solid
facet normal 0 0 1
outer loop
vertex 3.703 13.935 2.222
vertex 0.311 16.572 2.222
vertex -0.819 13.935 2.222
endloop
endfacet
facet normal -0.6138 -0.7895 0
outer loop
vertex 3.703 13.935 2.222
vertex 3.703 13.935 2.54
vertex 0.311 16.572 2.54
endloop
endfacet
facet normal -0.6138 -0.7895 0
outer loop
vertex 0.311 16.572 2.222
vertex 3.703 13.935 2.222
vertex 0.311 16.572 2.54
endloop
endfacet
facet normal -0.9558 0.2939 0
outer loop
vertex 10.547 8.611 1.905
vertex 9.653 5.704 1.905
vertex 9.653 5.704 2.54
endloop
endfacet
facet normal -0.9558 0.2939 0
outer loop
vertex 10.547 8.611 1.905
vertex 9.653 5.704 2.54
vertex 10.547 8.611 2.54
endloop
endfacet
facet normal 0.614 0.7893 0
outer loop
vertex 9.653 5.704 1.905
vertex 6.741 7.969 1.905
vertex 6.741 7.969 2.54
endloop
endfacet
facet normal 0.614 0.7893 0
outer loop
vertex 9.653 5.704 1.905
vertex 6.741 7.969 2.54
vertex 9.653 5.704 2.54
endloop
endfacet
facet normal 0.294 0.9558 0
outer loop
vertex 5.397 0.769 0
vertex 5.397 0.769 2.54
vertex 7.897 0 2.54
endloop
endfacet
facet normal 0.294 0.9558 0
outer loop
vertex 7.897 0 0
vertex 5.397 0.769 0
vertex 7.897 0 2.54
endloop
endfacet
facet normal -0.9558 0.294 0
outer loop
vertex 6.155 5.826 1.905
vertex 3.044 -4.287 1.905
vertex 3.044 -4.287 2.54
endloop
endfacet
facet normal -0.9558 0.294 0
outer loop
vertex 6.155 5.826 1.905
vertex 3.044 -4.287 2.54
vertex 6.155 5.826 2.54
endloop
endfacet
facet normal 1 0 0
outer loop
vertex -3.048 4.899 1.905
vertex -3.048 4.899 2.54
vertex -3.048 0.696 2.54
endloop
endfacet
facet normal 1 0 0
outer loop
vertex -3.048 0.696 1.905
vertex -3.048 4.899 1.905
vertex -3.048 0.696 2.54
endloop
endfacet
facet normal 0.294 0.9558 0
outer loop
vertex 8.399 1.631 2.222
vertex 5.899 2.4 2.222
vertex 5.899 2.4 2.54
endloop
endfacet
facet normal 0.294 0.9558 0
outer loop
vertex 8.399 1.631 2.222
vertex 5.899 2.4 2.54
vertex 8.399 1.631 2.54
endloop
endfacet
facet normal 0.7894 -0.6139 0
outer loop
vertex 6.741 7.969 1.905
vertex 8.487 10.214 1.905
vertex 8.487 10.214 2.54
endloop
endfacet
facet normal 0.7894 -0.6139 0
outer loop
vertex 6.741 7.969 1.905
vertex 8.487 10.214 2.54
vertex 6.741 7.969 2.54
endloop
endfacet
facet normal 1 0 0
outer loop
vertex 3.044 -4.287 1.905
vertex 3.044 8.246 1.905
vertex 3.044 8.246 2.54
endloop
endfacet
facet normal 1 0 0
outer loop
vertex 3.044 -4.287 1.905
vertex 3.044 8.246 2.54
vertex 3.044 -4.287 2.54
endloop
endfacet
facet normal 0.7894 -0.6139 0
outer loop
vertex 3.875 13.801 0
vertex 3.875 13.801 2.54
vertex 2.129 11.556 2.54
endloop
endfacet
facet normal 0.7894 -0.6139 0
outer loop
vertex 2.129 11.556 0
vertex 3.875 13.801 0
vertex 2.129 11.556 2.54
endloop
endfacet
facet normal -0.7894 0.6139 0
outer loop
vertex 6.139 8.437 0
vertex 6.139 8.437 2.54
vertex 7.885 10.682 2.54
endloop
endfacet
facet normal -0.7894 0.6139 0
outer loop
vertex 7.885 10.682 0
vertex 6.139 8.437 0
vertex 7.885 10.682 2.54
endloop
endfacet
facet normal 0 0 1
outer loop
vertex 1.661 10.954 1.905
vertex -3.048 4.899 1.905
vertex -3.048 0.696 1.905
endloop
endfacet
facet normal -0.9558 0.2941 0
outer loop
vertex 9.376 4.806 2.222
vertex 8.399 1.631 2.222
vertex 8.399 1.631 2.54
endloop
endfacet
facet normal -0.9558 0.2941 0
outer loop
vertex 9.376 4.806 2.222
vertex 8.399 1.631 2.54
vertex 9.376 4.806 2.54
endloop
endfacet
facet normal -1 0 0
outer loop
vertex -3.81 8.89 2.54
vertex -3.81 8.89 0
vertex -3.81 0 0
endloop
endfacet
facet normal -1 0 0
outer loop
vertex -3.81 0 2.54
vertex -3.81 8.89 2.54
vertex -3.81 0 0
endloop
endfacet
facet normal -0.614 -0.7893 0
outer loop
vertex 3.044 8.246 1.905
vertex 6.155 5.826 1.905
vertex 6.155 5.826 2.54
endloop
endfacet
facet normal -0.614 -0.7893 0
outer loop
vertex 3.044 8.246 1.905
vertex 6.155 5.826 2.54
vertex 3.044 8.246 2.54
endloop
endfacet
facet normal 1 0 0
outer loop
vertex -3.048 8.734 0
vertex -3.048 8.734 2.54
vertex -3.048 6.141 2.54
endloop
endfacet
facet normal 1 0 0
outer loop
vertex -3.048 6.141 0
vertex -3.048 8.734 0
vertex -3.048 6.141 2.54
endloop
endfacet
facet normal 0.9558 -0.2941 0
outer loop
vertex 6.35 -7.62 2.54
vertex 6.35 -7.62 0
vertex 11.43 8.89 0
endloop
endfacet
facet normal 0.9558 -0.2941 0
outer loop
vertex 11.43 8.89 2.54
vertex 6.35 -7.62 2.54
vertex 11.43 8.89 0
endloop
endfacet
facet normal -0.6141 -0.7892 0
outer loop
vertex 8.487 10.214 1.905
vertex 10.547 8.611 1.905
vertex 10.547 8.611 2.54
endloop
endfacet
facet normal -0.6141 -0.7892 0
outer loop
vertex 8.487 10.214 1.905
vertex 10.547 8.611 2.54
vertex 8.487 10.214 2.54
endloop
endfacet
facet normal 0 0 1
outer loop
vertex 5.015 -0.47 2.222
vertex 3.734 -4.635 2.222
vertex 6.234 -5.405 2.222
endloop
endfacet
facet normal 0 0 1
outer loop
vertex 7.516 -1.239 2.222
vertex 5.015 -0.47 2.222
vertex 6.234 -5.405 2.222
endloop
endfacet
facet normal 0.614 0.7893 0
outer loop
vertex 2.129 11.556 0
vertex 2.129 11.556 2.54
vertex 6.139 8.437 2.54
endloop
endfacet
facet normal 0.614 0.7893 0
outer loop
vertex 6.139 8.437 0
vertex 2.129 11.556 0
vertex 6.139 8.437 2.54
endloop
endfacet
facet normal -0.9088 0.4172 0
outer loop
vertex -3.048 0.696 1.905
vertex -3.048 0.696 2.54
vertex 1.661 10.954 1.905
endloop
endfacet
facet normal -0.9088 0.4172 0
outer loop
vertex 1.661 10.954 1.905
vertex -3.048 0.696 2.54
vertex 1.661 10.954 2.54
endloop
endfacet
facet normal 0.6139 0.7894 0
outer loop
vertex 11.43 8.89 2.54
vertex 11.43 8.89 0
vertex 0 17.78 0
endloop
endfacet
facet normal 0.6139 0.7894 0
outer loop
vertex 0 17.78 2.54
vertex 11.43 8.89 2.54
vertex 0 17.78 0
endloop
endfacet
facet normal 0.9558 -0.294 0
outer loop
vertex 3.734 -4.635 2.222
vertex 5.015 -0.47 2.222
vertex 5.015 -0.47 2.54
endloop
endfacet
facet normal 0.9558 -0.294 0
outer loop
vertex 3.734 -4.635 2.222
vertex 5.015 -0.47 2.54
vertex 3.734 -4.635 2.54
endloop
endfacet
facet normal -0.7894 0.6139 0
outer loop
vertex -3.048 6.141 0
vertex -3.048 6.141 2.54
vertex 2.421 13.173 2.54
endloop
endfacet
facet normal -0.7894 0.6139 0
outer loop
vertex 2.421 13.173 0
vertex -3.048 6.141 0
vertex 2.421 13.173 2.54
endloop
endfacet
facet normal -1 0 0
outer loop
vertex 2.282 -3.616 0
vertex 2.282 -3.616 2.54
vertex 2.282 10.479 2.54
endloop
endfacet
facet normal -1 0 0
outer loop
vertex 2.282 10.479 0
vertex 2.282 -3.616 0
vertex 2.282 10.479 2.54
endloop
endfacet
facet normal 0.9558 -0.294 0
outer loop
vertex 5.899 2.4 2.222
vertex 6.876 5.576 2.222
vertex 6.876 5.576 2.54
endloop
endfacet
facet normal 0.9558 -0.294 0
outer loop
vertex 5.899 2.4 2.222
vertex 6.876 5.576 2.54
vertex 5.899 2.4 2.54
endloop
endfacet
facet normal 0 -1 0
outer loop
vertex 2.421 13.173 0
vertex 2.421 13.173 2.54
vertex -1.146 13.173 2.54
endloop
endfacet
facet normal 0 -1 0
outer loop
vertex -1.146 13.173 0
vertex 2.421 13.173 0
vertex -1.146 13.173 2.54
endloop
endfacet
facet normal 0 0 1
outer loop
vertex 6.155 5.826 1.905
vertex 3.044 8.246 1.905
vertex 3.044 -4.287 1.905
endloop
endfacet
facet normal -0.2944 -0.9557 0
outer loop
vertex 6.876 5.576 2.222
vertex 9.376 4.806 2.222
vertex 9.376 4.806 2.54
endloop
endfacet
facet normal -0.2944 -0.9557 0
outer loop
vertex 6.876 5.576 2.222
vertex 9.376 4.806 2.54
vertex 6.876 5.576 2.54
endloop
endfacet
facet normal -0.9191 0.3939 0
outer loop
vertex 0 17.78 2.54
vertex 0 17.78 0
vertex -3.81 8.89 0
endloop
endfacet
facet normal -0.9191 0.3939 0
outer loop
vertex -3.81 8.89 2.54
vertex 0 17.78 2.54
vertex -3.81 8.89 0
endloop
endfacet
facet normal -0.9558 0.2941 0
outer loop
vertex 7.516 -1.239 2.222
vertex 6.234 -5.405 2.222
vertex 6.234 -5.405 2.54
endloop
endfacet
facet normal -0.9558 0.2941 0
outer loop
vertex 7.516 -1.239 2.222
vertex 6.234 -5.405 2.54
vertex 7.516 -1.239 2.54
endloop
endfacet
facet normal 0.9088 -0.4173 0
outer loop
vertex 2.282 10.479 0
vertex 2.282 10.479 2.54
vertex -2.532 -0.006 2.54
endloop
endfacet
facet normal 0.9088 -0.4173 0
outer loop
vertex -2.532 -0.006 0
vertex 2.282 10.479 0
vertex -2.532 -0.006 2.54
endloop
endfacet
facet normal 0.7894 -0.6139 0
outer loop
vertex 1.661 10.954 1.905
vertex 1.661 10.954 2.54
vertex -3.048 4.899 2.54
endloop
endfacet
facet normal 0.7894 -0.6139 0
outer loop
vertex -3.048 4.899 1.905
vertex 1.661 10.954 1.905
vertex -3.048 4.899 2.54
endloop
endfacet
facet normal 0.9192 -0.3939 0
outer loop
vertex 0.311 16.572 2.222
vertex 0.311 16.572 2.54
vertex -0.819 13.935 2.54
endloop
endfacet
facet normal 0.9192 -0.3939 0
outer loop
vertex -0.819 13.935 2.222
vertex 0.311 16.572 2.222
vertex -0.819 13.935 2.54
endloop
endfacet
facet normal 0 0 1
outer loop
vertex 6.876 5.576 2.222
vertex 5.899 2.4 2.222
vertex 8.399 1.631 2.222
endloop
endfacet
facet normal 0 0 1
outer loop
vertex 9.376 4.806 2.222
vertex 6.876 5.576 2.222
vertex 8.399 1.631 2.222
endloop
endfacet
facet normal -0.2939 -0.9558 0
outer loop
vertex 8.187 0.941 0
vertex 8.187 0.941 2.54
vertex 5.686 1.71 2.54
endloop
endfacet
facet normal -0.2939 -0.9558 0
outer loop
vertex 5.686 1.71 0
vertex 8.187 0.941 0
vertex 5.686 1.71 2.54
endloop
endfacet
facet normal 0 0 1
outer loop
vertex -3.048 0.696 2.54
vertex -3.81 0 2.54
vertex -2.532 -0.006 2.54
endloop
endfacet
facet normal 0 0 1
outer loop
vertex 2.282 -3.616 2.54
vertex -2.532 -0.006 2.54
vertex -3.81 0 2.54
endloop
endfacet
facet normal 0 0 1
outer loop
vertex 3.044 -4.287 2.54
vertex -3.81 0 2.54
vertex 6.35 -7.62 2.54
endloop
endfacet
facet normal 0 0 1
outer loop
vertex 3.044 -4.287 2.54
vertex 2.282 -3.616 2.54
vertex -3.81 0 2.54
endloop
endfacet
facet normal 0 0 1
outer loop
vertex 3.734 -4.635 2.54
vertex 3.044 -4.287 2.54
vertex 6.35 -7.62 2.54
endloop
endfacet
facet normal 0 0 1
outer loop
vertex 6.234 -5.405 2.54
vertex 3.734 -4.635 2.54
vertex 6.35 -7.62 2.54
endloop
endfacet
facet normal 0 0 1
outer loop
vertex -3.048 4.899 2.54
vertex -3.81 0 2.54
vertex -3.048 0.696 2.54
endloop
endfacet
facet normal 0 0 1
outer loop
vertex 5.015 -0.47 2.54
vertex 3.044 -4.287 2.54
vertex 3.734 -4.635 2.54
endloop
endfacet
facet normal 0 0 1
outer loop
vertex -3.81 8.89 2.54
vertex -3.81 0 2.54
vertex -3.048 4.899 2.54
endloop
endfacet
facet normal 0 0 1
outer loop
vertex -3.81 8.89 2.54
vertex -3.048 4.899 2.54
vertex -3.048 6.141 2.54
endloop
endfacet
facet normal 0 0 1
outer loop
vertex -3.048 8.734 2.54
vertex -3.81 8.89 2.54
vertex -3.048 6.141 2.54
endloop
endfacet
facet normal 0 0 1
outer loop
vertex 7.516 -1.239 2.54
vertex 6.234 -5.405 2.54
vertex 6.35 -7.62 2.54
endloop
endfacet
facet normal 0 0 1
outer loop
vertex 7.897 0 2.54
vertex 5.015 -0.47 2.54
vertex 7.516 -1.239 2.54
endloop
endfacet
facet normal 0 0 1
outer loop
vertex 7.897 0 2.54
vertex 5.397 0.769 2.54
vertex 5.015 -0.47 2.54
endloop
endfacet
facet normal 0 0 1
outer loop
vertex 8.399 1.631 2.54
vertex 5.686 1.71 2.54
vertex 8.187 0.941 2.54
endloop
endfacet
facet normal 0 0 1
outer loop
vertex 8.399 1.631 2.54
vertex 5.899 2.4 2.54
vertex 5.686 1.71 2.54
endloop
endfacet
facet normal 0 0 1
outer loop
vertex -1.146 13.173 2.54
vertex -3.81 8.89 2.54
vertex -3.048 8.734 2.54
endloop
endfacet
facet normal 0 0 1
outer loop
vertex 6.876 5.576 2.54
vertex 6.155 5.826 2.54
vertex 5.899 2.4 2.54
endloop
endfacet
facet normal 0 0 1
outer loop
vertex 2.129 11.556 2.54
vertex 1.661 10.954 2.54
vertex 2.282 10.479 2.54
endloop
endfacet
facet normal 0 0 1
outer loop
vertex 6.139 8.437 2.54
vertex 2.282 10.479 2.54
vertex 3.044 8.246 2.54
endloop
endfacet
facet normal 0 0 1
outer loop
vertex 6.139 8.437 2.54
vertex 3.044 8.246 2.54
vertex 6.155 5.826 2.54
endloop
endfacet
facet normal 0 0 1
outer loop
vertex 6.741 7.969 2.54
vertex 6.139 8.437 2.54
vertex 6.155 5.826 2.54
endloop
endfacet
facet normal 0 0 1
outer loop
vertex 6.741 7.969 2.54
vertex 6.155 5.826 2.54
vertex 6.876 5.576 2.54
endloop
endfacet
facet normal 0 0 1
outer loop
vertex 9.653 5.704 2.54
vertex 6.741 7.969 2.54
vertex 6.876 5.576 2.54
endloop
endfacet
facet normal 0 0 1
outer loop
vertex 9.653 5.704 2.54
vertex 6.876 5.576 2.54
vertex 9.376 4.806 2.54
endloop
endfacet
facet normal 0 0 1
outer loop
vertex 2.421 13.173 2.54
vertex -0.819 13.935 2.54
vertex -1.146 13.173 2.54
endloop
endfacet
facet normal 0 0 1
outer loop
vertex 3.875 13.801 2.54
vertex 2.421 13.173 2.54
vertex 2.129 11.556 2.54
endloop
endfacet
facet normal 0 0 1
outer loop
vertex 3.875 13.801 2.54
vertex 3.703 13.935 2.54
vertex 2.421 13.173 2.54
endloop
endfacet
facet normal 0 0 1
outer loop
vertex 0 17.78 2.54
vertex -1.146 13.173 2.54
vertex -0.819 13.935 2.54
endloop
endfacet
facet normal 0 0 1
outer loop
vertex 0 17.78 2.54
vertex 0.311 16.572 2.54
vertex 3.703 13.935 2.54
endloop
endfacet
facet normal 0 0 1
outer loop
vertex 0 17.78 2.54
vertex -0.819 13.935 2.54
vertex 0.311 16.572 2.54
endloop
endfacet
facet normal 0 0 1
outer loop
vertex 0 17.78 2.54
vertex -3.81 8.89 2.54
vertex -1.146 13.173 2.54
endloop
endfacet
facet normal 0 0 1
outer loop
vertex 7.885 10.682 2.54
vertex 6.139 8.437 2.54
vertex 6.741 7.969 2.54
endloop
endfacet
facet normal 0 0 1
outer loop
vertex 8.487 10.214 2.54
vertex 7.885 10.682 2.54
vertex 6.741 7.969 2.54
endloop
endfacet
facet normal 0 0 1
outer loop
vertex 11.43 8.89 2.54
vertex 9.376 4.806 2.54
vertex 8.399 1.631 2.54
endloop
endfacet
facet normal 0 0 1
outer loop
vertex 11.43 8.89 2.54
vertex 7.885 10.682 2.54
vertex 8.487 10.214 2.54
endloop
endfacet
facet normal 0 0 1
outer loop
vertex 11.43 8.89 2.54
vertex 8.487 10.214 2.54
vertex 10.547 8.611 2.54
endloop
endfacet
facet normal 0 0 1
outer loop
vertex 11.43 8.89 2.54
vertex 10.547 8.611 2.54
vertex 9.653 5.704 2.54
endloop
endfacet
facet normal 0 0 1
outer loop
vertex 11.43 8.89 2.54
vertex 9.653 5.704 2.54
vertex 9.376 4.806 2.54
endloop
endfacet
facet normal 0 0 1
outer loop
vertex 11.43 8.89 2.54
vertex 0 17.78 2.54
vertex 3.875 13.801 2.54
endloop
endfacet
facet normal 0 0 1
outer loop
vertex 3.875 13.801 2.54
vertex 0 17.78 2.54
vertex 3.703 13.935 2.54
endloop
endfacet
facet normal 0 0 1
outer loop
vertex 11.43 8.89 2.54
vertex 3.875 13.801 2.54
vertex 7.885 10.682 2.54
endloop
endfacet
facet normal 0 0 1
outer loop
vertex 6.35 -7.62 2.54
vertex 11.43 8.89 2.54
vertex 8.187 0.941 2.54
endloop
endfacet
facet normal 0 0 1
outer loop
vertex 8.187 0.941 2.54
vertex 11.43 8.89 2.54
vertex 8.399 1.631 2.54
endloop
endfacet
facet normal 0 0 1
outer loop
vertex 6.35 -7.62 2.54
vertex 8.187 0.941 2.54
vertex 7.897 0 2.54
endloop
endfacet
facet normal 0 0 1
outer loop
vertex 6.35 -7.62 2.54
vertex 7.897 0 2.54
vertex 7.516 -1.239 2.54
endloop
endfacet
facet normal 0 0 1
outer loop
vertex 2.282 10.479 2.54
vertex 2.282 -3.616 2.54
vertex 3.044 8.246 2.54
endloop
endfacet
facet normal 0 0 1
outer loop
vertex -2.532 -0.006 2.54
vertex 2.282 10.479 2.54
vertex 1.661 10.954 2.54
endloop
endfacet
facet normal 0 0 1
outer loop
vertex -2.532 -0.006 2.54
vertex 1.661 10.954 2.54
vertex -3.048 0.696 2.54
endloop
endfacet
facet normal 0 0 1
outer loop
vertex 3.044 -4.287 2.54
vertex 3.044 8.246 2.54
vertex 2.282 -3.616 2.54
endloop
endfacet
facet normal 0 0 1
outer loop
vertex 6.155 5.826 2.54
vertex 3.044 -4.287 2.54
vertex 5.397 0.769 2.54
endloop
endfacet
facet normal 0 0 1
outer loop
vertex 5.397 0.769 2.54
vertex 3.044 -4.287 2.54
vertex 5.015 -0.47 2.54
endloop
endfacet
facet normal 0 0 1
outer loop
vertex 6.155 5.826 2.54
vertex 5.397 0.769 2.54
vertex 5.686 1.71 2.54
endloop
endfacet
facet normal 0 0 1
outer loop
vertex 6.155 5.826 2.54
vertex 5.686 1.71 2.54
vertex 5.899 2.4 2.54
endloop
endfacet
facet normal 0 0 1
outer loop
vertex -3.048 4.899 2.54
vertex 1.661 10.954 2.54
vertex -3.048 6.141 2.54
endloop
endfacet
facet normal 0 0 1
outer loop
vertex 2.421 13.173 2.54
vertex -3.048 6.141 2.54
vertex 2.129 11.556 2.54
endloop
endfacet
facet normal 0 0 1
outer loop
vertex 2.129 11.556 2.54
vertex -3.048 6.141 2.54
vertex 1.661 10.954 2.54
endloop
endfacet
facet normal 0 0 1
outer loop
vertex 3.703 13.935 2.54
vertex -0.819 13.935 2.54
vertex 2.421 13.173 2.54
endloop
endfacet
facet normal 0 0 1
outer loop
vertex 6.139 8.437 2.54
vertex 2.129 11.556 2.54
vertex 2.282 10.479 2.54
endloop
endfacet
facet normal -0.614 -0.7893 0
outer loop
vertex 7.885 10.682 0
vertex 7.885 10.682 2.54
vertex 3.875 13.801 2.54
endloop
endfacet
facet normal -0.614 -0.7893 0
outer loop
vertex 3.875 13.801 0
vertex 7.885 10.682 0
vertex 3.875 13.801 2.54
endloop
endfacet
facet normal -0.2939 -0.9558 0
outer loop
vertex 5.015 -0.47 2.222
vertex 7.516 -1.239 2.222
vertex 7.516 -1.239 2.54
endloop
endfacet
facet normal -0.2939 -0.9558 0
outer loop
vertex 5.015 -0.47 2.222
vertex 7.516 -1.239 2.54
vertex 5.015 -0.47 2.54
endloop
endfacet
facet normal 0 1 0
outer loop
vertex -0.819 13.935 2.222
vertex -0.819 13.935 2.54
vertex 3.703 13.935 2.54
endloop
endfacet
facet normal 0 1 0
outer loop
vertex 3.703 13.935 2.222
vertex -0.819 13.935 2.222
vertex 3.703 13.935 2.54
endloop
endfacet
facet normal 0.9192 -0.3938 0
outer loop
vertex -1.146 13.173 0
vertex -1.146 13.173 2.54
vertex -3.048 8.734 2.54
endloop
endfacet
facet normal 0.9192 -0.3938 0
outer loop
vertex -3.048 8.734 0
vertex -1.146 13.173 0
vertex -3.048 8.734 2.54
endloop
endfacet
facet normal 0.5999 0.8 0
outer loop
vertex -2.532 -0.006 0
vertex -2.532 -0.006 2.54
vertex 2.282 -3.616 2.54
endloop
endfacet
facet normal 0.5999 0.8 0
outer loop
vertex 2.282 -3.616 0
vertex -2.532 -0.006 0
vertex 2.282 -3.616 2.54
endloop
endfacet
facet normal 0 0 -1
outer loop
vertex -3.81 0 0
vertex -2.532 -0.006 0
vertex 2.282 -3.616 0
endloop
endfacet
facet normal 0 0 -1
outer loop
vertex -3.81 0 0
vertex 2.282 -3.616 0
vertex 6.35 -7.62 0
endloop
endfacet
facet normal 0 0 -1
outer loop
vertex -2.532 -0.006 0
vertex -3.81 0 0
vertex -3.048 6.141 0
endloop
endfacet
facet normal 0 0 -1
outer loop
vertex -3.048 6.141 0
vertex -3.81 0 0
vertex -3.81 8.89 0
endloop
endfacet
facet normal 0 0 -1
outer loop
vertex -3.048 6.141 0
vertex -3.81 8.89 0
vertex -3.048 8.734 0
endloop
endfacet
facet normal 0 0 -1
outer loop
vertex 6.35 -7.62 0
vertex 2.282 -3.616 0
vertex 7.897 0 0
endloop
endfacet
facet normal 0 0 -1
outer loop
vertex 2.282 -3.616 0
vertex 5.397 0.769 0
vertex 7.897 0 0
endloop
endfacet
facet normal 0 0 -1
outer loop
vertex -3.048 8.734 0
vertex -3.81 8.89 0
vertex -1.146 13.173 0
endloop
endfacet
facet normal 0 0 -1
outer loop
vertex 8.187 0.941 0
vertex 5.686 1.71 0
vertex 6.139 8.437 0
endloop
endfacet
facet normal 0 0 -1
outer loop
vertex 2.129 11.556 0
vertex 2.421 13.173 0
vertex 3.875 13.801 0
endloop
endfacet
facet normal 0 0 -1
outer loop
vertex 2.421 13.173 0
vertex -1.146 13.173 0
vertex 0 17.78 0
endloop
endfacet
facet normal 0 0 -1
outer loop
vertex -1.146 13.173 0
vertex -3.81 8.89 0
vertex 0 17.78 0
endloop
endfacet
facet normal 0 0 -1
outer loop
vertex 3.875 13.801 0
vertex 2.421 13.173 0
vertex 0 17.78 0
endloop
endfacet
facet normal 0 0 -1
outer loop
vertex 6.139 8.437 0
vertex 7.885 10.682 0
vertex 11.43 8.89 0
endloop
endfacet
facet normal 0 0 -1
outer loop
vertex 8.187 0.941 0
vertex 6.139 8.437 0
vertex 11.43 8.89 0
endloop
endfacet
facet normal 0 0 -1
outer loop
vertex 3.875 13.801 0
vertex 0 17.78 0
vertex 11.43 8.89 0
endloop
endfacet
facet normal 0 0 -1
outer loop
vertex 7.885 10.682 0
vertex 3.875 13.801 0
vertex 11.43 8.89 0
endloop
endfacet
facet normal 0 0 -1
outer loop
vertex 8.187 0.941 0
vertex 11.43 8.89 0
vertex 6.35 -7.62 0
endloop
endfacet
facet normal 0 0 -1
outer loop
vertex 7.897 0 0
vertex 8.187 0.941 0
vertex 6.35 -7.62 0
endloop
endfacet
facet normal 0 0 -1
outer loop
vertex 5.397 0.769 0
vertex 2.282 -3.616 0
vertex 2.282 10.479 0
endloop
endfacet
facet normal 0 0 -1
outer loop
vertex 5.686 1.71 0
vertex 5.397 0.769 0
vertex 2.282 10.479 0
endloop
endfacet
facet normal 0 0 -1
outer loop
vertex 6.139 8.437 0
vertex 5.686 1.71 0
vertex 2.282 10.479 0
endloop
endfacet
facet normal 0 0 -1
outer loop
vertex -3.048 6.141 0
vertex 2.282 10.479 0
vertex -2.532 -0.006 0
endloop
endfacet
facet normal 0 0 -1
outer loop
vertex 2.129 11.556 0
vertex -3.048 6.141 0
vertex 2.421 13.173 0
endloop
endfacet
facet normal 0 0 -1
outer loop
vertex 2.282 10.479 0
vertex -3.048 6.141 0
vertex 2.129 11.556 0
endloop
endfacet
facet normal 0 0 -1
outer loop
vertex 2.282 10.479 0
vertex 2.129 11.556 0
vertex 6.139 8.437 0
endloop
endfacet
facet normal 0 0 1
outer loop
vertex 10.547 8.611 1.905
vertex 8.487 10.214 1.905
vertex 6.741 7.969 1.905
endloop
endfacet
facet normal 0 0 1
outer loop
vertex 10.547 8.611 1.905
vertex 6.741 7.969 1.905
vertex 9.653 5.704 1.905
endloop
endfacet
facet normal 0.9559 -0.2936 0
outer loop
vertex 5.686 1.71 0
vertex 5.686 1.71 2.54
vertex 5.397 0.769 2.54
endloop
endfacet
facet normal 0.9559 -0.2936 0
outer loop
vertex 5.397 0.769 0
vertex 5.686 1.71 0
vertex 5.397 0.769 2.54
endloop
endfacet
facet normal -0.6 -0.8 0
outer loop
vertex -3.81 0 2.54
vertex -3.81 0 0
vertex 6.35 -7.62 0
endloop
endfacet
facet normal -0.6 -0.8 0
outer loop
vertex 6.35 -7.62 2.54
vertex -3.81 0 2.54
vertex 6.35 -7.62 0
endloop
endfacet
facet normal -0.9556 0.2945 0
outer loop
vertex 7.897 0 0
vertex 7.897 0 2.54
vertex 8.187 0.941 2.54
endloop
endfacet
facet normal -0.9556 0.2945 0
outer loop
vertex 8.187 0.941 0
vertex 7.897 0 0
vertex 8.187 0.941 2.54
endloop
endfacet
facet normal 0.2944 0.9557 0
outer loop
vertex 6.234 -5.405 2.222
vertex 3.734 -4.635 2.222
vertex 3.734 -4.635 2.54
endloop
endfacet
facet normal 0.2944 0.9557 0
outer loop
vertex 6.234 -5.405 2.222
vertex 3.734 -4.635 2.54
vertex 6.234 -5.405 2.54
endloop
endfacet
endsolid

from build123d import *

# Parameters (mm, degrees)
F1_DEPTH = 2.54
F3_DEPTH = 2.541
F4_DEPTH = 0.635
F5_DEPTH = 0.3175


with BuildPart() as f1:
    # F0 (on Top) → F1 (new body)
    with BuildSketch(Plane.XY):
        Polygon((11.43, 8.89), (0, 17.78), (-3.81, 8.89), (-3.81, 0), (6.35, -7.62), align=None)
    extrude(amount=F1_DEPTH)

    # F2 (on face) → F3 (cut, through all)
    with BuildSketch(Plane.XY.offset(2.54)):
        Polygon((-3.048, 6.140546), (2.421456, 13.172704), (-1.145524, 13.172704), (-3.048, 8.733594), align=None)
        Polygon((7.885093, 10.681801), (3.875184, 13.80062), (2.129282, 11.555889), (6.139191, 8.43707), align=None)
        Polygon((2.281741, -3.616306), (2.281741, 10.479143), (-2.531702, -0.006223), align=None)
        Polygon((8.186874, 0.94092), (5.686294, 1.710329), (5.39678, 0.769409), (7.89736, 0), align=None)
    extrude(amount=-F3_DEPTH, mode=Mode.SUBTRACT)

    # F2 (on face) → F4 (cut, symmetric)
    with BuildSketch(Plane.XY.offset(2.54)):
        Polygon((6.155309, 5.825708), (3.043741, 8.245816), (3.043741, -4.286889), align=None)
        Polygon((10.547025, 8.61141), (8.486579, 10.213979), (6.740677, 7.969248), (9.652572, 5.70444), align=None)
        Polygon((-3.048, 0.69555), (1.661459, 10.954402), (-3.048, 4.899384), align=None)
    extrude(amount=F4_DEPTH, both=True, mode=Mode.SUBTRACT)

    # F2 (on face) → F5 (cut, symmetric)
    with BuildSketch(Plane.XY.offset(2.54)):
        Polygon((7.51598, -1.239484), (5.015401, -0.470075), (3.733805, -4.635261), (6.234384, -5.40467), align=None)
        Polygon((9.376229, 4.806324), (6.875649, 5.575733), (5.898628, 2.400413), (8.399207, 1.631004), align=None)
        Polygon((3.70279, 13.934704), (0.311483, 16.572387), (-0.818953, 13.934704), align=None)
    extrude(amount=F5_DEPTH, both=True, mode=Mode.SUBTRACT)


solid = f1.part
